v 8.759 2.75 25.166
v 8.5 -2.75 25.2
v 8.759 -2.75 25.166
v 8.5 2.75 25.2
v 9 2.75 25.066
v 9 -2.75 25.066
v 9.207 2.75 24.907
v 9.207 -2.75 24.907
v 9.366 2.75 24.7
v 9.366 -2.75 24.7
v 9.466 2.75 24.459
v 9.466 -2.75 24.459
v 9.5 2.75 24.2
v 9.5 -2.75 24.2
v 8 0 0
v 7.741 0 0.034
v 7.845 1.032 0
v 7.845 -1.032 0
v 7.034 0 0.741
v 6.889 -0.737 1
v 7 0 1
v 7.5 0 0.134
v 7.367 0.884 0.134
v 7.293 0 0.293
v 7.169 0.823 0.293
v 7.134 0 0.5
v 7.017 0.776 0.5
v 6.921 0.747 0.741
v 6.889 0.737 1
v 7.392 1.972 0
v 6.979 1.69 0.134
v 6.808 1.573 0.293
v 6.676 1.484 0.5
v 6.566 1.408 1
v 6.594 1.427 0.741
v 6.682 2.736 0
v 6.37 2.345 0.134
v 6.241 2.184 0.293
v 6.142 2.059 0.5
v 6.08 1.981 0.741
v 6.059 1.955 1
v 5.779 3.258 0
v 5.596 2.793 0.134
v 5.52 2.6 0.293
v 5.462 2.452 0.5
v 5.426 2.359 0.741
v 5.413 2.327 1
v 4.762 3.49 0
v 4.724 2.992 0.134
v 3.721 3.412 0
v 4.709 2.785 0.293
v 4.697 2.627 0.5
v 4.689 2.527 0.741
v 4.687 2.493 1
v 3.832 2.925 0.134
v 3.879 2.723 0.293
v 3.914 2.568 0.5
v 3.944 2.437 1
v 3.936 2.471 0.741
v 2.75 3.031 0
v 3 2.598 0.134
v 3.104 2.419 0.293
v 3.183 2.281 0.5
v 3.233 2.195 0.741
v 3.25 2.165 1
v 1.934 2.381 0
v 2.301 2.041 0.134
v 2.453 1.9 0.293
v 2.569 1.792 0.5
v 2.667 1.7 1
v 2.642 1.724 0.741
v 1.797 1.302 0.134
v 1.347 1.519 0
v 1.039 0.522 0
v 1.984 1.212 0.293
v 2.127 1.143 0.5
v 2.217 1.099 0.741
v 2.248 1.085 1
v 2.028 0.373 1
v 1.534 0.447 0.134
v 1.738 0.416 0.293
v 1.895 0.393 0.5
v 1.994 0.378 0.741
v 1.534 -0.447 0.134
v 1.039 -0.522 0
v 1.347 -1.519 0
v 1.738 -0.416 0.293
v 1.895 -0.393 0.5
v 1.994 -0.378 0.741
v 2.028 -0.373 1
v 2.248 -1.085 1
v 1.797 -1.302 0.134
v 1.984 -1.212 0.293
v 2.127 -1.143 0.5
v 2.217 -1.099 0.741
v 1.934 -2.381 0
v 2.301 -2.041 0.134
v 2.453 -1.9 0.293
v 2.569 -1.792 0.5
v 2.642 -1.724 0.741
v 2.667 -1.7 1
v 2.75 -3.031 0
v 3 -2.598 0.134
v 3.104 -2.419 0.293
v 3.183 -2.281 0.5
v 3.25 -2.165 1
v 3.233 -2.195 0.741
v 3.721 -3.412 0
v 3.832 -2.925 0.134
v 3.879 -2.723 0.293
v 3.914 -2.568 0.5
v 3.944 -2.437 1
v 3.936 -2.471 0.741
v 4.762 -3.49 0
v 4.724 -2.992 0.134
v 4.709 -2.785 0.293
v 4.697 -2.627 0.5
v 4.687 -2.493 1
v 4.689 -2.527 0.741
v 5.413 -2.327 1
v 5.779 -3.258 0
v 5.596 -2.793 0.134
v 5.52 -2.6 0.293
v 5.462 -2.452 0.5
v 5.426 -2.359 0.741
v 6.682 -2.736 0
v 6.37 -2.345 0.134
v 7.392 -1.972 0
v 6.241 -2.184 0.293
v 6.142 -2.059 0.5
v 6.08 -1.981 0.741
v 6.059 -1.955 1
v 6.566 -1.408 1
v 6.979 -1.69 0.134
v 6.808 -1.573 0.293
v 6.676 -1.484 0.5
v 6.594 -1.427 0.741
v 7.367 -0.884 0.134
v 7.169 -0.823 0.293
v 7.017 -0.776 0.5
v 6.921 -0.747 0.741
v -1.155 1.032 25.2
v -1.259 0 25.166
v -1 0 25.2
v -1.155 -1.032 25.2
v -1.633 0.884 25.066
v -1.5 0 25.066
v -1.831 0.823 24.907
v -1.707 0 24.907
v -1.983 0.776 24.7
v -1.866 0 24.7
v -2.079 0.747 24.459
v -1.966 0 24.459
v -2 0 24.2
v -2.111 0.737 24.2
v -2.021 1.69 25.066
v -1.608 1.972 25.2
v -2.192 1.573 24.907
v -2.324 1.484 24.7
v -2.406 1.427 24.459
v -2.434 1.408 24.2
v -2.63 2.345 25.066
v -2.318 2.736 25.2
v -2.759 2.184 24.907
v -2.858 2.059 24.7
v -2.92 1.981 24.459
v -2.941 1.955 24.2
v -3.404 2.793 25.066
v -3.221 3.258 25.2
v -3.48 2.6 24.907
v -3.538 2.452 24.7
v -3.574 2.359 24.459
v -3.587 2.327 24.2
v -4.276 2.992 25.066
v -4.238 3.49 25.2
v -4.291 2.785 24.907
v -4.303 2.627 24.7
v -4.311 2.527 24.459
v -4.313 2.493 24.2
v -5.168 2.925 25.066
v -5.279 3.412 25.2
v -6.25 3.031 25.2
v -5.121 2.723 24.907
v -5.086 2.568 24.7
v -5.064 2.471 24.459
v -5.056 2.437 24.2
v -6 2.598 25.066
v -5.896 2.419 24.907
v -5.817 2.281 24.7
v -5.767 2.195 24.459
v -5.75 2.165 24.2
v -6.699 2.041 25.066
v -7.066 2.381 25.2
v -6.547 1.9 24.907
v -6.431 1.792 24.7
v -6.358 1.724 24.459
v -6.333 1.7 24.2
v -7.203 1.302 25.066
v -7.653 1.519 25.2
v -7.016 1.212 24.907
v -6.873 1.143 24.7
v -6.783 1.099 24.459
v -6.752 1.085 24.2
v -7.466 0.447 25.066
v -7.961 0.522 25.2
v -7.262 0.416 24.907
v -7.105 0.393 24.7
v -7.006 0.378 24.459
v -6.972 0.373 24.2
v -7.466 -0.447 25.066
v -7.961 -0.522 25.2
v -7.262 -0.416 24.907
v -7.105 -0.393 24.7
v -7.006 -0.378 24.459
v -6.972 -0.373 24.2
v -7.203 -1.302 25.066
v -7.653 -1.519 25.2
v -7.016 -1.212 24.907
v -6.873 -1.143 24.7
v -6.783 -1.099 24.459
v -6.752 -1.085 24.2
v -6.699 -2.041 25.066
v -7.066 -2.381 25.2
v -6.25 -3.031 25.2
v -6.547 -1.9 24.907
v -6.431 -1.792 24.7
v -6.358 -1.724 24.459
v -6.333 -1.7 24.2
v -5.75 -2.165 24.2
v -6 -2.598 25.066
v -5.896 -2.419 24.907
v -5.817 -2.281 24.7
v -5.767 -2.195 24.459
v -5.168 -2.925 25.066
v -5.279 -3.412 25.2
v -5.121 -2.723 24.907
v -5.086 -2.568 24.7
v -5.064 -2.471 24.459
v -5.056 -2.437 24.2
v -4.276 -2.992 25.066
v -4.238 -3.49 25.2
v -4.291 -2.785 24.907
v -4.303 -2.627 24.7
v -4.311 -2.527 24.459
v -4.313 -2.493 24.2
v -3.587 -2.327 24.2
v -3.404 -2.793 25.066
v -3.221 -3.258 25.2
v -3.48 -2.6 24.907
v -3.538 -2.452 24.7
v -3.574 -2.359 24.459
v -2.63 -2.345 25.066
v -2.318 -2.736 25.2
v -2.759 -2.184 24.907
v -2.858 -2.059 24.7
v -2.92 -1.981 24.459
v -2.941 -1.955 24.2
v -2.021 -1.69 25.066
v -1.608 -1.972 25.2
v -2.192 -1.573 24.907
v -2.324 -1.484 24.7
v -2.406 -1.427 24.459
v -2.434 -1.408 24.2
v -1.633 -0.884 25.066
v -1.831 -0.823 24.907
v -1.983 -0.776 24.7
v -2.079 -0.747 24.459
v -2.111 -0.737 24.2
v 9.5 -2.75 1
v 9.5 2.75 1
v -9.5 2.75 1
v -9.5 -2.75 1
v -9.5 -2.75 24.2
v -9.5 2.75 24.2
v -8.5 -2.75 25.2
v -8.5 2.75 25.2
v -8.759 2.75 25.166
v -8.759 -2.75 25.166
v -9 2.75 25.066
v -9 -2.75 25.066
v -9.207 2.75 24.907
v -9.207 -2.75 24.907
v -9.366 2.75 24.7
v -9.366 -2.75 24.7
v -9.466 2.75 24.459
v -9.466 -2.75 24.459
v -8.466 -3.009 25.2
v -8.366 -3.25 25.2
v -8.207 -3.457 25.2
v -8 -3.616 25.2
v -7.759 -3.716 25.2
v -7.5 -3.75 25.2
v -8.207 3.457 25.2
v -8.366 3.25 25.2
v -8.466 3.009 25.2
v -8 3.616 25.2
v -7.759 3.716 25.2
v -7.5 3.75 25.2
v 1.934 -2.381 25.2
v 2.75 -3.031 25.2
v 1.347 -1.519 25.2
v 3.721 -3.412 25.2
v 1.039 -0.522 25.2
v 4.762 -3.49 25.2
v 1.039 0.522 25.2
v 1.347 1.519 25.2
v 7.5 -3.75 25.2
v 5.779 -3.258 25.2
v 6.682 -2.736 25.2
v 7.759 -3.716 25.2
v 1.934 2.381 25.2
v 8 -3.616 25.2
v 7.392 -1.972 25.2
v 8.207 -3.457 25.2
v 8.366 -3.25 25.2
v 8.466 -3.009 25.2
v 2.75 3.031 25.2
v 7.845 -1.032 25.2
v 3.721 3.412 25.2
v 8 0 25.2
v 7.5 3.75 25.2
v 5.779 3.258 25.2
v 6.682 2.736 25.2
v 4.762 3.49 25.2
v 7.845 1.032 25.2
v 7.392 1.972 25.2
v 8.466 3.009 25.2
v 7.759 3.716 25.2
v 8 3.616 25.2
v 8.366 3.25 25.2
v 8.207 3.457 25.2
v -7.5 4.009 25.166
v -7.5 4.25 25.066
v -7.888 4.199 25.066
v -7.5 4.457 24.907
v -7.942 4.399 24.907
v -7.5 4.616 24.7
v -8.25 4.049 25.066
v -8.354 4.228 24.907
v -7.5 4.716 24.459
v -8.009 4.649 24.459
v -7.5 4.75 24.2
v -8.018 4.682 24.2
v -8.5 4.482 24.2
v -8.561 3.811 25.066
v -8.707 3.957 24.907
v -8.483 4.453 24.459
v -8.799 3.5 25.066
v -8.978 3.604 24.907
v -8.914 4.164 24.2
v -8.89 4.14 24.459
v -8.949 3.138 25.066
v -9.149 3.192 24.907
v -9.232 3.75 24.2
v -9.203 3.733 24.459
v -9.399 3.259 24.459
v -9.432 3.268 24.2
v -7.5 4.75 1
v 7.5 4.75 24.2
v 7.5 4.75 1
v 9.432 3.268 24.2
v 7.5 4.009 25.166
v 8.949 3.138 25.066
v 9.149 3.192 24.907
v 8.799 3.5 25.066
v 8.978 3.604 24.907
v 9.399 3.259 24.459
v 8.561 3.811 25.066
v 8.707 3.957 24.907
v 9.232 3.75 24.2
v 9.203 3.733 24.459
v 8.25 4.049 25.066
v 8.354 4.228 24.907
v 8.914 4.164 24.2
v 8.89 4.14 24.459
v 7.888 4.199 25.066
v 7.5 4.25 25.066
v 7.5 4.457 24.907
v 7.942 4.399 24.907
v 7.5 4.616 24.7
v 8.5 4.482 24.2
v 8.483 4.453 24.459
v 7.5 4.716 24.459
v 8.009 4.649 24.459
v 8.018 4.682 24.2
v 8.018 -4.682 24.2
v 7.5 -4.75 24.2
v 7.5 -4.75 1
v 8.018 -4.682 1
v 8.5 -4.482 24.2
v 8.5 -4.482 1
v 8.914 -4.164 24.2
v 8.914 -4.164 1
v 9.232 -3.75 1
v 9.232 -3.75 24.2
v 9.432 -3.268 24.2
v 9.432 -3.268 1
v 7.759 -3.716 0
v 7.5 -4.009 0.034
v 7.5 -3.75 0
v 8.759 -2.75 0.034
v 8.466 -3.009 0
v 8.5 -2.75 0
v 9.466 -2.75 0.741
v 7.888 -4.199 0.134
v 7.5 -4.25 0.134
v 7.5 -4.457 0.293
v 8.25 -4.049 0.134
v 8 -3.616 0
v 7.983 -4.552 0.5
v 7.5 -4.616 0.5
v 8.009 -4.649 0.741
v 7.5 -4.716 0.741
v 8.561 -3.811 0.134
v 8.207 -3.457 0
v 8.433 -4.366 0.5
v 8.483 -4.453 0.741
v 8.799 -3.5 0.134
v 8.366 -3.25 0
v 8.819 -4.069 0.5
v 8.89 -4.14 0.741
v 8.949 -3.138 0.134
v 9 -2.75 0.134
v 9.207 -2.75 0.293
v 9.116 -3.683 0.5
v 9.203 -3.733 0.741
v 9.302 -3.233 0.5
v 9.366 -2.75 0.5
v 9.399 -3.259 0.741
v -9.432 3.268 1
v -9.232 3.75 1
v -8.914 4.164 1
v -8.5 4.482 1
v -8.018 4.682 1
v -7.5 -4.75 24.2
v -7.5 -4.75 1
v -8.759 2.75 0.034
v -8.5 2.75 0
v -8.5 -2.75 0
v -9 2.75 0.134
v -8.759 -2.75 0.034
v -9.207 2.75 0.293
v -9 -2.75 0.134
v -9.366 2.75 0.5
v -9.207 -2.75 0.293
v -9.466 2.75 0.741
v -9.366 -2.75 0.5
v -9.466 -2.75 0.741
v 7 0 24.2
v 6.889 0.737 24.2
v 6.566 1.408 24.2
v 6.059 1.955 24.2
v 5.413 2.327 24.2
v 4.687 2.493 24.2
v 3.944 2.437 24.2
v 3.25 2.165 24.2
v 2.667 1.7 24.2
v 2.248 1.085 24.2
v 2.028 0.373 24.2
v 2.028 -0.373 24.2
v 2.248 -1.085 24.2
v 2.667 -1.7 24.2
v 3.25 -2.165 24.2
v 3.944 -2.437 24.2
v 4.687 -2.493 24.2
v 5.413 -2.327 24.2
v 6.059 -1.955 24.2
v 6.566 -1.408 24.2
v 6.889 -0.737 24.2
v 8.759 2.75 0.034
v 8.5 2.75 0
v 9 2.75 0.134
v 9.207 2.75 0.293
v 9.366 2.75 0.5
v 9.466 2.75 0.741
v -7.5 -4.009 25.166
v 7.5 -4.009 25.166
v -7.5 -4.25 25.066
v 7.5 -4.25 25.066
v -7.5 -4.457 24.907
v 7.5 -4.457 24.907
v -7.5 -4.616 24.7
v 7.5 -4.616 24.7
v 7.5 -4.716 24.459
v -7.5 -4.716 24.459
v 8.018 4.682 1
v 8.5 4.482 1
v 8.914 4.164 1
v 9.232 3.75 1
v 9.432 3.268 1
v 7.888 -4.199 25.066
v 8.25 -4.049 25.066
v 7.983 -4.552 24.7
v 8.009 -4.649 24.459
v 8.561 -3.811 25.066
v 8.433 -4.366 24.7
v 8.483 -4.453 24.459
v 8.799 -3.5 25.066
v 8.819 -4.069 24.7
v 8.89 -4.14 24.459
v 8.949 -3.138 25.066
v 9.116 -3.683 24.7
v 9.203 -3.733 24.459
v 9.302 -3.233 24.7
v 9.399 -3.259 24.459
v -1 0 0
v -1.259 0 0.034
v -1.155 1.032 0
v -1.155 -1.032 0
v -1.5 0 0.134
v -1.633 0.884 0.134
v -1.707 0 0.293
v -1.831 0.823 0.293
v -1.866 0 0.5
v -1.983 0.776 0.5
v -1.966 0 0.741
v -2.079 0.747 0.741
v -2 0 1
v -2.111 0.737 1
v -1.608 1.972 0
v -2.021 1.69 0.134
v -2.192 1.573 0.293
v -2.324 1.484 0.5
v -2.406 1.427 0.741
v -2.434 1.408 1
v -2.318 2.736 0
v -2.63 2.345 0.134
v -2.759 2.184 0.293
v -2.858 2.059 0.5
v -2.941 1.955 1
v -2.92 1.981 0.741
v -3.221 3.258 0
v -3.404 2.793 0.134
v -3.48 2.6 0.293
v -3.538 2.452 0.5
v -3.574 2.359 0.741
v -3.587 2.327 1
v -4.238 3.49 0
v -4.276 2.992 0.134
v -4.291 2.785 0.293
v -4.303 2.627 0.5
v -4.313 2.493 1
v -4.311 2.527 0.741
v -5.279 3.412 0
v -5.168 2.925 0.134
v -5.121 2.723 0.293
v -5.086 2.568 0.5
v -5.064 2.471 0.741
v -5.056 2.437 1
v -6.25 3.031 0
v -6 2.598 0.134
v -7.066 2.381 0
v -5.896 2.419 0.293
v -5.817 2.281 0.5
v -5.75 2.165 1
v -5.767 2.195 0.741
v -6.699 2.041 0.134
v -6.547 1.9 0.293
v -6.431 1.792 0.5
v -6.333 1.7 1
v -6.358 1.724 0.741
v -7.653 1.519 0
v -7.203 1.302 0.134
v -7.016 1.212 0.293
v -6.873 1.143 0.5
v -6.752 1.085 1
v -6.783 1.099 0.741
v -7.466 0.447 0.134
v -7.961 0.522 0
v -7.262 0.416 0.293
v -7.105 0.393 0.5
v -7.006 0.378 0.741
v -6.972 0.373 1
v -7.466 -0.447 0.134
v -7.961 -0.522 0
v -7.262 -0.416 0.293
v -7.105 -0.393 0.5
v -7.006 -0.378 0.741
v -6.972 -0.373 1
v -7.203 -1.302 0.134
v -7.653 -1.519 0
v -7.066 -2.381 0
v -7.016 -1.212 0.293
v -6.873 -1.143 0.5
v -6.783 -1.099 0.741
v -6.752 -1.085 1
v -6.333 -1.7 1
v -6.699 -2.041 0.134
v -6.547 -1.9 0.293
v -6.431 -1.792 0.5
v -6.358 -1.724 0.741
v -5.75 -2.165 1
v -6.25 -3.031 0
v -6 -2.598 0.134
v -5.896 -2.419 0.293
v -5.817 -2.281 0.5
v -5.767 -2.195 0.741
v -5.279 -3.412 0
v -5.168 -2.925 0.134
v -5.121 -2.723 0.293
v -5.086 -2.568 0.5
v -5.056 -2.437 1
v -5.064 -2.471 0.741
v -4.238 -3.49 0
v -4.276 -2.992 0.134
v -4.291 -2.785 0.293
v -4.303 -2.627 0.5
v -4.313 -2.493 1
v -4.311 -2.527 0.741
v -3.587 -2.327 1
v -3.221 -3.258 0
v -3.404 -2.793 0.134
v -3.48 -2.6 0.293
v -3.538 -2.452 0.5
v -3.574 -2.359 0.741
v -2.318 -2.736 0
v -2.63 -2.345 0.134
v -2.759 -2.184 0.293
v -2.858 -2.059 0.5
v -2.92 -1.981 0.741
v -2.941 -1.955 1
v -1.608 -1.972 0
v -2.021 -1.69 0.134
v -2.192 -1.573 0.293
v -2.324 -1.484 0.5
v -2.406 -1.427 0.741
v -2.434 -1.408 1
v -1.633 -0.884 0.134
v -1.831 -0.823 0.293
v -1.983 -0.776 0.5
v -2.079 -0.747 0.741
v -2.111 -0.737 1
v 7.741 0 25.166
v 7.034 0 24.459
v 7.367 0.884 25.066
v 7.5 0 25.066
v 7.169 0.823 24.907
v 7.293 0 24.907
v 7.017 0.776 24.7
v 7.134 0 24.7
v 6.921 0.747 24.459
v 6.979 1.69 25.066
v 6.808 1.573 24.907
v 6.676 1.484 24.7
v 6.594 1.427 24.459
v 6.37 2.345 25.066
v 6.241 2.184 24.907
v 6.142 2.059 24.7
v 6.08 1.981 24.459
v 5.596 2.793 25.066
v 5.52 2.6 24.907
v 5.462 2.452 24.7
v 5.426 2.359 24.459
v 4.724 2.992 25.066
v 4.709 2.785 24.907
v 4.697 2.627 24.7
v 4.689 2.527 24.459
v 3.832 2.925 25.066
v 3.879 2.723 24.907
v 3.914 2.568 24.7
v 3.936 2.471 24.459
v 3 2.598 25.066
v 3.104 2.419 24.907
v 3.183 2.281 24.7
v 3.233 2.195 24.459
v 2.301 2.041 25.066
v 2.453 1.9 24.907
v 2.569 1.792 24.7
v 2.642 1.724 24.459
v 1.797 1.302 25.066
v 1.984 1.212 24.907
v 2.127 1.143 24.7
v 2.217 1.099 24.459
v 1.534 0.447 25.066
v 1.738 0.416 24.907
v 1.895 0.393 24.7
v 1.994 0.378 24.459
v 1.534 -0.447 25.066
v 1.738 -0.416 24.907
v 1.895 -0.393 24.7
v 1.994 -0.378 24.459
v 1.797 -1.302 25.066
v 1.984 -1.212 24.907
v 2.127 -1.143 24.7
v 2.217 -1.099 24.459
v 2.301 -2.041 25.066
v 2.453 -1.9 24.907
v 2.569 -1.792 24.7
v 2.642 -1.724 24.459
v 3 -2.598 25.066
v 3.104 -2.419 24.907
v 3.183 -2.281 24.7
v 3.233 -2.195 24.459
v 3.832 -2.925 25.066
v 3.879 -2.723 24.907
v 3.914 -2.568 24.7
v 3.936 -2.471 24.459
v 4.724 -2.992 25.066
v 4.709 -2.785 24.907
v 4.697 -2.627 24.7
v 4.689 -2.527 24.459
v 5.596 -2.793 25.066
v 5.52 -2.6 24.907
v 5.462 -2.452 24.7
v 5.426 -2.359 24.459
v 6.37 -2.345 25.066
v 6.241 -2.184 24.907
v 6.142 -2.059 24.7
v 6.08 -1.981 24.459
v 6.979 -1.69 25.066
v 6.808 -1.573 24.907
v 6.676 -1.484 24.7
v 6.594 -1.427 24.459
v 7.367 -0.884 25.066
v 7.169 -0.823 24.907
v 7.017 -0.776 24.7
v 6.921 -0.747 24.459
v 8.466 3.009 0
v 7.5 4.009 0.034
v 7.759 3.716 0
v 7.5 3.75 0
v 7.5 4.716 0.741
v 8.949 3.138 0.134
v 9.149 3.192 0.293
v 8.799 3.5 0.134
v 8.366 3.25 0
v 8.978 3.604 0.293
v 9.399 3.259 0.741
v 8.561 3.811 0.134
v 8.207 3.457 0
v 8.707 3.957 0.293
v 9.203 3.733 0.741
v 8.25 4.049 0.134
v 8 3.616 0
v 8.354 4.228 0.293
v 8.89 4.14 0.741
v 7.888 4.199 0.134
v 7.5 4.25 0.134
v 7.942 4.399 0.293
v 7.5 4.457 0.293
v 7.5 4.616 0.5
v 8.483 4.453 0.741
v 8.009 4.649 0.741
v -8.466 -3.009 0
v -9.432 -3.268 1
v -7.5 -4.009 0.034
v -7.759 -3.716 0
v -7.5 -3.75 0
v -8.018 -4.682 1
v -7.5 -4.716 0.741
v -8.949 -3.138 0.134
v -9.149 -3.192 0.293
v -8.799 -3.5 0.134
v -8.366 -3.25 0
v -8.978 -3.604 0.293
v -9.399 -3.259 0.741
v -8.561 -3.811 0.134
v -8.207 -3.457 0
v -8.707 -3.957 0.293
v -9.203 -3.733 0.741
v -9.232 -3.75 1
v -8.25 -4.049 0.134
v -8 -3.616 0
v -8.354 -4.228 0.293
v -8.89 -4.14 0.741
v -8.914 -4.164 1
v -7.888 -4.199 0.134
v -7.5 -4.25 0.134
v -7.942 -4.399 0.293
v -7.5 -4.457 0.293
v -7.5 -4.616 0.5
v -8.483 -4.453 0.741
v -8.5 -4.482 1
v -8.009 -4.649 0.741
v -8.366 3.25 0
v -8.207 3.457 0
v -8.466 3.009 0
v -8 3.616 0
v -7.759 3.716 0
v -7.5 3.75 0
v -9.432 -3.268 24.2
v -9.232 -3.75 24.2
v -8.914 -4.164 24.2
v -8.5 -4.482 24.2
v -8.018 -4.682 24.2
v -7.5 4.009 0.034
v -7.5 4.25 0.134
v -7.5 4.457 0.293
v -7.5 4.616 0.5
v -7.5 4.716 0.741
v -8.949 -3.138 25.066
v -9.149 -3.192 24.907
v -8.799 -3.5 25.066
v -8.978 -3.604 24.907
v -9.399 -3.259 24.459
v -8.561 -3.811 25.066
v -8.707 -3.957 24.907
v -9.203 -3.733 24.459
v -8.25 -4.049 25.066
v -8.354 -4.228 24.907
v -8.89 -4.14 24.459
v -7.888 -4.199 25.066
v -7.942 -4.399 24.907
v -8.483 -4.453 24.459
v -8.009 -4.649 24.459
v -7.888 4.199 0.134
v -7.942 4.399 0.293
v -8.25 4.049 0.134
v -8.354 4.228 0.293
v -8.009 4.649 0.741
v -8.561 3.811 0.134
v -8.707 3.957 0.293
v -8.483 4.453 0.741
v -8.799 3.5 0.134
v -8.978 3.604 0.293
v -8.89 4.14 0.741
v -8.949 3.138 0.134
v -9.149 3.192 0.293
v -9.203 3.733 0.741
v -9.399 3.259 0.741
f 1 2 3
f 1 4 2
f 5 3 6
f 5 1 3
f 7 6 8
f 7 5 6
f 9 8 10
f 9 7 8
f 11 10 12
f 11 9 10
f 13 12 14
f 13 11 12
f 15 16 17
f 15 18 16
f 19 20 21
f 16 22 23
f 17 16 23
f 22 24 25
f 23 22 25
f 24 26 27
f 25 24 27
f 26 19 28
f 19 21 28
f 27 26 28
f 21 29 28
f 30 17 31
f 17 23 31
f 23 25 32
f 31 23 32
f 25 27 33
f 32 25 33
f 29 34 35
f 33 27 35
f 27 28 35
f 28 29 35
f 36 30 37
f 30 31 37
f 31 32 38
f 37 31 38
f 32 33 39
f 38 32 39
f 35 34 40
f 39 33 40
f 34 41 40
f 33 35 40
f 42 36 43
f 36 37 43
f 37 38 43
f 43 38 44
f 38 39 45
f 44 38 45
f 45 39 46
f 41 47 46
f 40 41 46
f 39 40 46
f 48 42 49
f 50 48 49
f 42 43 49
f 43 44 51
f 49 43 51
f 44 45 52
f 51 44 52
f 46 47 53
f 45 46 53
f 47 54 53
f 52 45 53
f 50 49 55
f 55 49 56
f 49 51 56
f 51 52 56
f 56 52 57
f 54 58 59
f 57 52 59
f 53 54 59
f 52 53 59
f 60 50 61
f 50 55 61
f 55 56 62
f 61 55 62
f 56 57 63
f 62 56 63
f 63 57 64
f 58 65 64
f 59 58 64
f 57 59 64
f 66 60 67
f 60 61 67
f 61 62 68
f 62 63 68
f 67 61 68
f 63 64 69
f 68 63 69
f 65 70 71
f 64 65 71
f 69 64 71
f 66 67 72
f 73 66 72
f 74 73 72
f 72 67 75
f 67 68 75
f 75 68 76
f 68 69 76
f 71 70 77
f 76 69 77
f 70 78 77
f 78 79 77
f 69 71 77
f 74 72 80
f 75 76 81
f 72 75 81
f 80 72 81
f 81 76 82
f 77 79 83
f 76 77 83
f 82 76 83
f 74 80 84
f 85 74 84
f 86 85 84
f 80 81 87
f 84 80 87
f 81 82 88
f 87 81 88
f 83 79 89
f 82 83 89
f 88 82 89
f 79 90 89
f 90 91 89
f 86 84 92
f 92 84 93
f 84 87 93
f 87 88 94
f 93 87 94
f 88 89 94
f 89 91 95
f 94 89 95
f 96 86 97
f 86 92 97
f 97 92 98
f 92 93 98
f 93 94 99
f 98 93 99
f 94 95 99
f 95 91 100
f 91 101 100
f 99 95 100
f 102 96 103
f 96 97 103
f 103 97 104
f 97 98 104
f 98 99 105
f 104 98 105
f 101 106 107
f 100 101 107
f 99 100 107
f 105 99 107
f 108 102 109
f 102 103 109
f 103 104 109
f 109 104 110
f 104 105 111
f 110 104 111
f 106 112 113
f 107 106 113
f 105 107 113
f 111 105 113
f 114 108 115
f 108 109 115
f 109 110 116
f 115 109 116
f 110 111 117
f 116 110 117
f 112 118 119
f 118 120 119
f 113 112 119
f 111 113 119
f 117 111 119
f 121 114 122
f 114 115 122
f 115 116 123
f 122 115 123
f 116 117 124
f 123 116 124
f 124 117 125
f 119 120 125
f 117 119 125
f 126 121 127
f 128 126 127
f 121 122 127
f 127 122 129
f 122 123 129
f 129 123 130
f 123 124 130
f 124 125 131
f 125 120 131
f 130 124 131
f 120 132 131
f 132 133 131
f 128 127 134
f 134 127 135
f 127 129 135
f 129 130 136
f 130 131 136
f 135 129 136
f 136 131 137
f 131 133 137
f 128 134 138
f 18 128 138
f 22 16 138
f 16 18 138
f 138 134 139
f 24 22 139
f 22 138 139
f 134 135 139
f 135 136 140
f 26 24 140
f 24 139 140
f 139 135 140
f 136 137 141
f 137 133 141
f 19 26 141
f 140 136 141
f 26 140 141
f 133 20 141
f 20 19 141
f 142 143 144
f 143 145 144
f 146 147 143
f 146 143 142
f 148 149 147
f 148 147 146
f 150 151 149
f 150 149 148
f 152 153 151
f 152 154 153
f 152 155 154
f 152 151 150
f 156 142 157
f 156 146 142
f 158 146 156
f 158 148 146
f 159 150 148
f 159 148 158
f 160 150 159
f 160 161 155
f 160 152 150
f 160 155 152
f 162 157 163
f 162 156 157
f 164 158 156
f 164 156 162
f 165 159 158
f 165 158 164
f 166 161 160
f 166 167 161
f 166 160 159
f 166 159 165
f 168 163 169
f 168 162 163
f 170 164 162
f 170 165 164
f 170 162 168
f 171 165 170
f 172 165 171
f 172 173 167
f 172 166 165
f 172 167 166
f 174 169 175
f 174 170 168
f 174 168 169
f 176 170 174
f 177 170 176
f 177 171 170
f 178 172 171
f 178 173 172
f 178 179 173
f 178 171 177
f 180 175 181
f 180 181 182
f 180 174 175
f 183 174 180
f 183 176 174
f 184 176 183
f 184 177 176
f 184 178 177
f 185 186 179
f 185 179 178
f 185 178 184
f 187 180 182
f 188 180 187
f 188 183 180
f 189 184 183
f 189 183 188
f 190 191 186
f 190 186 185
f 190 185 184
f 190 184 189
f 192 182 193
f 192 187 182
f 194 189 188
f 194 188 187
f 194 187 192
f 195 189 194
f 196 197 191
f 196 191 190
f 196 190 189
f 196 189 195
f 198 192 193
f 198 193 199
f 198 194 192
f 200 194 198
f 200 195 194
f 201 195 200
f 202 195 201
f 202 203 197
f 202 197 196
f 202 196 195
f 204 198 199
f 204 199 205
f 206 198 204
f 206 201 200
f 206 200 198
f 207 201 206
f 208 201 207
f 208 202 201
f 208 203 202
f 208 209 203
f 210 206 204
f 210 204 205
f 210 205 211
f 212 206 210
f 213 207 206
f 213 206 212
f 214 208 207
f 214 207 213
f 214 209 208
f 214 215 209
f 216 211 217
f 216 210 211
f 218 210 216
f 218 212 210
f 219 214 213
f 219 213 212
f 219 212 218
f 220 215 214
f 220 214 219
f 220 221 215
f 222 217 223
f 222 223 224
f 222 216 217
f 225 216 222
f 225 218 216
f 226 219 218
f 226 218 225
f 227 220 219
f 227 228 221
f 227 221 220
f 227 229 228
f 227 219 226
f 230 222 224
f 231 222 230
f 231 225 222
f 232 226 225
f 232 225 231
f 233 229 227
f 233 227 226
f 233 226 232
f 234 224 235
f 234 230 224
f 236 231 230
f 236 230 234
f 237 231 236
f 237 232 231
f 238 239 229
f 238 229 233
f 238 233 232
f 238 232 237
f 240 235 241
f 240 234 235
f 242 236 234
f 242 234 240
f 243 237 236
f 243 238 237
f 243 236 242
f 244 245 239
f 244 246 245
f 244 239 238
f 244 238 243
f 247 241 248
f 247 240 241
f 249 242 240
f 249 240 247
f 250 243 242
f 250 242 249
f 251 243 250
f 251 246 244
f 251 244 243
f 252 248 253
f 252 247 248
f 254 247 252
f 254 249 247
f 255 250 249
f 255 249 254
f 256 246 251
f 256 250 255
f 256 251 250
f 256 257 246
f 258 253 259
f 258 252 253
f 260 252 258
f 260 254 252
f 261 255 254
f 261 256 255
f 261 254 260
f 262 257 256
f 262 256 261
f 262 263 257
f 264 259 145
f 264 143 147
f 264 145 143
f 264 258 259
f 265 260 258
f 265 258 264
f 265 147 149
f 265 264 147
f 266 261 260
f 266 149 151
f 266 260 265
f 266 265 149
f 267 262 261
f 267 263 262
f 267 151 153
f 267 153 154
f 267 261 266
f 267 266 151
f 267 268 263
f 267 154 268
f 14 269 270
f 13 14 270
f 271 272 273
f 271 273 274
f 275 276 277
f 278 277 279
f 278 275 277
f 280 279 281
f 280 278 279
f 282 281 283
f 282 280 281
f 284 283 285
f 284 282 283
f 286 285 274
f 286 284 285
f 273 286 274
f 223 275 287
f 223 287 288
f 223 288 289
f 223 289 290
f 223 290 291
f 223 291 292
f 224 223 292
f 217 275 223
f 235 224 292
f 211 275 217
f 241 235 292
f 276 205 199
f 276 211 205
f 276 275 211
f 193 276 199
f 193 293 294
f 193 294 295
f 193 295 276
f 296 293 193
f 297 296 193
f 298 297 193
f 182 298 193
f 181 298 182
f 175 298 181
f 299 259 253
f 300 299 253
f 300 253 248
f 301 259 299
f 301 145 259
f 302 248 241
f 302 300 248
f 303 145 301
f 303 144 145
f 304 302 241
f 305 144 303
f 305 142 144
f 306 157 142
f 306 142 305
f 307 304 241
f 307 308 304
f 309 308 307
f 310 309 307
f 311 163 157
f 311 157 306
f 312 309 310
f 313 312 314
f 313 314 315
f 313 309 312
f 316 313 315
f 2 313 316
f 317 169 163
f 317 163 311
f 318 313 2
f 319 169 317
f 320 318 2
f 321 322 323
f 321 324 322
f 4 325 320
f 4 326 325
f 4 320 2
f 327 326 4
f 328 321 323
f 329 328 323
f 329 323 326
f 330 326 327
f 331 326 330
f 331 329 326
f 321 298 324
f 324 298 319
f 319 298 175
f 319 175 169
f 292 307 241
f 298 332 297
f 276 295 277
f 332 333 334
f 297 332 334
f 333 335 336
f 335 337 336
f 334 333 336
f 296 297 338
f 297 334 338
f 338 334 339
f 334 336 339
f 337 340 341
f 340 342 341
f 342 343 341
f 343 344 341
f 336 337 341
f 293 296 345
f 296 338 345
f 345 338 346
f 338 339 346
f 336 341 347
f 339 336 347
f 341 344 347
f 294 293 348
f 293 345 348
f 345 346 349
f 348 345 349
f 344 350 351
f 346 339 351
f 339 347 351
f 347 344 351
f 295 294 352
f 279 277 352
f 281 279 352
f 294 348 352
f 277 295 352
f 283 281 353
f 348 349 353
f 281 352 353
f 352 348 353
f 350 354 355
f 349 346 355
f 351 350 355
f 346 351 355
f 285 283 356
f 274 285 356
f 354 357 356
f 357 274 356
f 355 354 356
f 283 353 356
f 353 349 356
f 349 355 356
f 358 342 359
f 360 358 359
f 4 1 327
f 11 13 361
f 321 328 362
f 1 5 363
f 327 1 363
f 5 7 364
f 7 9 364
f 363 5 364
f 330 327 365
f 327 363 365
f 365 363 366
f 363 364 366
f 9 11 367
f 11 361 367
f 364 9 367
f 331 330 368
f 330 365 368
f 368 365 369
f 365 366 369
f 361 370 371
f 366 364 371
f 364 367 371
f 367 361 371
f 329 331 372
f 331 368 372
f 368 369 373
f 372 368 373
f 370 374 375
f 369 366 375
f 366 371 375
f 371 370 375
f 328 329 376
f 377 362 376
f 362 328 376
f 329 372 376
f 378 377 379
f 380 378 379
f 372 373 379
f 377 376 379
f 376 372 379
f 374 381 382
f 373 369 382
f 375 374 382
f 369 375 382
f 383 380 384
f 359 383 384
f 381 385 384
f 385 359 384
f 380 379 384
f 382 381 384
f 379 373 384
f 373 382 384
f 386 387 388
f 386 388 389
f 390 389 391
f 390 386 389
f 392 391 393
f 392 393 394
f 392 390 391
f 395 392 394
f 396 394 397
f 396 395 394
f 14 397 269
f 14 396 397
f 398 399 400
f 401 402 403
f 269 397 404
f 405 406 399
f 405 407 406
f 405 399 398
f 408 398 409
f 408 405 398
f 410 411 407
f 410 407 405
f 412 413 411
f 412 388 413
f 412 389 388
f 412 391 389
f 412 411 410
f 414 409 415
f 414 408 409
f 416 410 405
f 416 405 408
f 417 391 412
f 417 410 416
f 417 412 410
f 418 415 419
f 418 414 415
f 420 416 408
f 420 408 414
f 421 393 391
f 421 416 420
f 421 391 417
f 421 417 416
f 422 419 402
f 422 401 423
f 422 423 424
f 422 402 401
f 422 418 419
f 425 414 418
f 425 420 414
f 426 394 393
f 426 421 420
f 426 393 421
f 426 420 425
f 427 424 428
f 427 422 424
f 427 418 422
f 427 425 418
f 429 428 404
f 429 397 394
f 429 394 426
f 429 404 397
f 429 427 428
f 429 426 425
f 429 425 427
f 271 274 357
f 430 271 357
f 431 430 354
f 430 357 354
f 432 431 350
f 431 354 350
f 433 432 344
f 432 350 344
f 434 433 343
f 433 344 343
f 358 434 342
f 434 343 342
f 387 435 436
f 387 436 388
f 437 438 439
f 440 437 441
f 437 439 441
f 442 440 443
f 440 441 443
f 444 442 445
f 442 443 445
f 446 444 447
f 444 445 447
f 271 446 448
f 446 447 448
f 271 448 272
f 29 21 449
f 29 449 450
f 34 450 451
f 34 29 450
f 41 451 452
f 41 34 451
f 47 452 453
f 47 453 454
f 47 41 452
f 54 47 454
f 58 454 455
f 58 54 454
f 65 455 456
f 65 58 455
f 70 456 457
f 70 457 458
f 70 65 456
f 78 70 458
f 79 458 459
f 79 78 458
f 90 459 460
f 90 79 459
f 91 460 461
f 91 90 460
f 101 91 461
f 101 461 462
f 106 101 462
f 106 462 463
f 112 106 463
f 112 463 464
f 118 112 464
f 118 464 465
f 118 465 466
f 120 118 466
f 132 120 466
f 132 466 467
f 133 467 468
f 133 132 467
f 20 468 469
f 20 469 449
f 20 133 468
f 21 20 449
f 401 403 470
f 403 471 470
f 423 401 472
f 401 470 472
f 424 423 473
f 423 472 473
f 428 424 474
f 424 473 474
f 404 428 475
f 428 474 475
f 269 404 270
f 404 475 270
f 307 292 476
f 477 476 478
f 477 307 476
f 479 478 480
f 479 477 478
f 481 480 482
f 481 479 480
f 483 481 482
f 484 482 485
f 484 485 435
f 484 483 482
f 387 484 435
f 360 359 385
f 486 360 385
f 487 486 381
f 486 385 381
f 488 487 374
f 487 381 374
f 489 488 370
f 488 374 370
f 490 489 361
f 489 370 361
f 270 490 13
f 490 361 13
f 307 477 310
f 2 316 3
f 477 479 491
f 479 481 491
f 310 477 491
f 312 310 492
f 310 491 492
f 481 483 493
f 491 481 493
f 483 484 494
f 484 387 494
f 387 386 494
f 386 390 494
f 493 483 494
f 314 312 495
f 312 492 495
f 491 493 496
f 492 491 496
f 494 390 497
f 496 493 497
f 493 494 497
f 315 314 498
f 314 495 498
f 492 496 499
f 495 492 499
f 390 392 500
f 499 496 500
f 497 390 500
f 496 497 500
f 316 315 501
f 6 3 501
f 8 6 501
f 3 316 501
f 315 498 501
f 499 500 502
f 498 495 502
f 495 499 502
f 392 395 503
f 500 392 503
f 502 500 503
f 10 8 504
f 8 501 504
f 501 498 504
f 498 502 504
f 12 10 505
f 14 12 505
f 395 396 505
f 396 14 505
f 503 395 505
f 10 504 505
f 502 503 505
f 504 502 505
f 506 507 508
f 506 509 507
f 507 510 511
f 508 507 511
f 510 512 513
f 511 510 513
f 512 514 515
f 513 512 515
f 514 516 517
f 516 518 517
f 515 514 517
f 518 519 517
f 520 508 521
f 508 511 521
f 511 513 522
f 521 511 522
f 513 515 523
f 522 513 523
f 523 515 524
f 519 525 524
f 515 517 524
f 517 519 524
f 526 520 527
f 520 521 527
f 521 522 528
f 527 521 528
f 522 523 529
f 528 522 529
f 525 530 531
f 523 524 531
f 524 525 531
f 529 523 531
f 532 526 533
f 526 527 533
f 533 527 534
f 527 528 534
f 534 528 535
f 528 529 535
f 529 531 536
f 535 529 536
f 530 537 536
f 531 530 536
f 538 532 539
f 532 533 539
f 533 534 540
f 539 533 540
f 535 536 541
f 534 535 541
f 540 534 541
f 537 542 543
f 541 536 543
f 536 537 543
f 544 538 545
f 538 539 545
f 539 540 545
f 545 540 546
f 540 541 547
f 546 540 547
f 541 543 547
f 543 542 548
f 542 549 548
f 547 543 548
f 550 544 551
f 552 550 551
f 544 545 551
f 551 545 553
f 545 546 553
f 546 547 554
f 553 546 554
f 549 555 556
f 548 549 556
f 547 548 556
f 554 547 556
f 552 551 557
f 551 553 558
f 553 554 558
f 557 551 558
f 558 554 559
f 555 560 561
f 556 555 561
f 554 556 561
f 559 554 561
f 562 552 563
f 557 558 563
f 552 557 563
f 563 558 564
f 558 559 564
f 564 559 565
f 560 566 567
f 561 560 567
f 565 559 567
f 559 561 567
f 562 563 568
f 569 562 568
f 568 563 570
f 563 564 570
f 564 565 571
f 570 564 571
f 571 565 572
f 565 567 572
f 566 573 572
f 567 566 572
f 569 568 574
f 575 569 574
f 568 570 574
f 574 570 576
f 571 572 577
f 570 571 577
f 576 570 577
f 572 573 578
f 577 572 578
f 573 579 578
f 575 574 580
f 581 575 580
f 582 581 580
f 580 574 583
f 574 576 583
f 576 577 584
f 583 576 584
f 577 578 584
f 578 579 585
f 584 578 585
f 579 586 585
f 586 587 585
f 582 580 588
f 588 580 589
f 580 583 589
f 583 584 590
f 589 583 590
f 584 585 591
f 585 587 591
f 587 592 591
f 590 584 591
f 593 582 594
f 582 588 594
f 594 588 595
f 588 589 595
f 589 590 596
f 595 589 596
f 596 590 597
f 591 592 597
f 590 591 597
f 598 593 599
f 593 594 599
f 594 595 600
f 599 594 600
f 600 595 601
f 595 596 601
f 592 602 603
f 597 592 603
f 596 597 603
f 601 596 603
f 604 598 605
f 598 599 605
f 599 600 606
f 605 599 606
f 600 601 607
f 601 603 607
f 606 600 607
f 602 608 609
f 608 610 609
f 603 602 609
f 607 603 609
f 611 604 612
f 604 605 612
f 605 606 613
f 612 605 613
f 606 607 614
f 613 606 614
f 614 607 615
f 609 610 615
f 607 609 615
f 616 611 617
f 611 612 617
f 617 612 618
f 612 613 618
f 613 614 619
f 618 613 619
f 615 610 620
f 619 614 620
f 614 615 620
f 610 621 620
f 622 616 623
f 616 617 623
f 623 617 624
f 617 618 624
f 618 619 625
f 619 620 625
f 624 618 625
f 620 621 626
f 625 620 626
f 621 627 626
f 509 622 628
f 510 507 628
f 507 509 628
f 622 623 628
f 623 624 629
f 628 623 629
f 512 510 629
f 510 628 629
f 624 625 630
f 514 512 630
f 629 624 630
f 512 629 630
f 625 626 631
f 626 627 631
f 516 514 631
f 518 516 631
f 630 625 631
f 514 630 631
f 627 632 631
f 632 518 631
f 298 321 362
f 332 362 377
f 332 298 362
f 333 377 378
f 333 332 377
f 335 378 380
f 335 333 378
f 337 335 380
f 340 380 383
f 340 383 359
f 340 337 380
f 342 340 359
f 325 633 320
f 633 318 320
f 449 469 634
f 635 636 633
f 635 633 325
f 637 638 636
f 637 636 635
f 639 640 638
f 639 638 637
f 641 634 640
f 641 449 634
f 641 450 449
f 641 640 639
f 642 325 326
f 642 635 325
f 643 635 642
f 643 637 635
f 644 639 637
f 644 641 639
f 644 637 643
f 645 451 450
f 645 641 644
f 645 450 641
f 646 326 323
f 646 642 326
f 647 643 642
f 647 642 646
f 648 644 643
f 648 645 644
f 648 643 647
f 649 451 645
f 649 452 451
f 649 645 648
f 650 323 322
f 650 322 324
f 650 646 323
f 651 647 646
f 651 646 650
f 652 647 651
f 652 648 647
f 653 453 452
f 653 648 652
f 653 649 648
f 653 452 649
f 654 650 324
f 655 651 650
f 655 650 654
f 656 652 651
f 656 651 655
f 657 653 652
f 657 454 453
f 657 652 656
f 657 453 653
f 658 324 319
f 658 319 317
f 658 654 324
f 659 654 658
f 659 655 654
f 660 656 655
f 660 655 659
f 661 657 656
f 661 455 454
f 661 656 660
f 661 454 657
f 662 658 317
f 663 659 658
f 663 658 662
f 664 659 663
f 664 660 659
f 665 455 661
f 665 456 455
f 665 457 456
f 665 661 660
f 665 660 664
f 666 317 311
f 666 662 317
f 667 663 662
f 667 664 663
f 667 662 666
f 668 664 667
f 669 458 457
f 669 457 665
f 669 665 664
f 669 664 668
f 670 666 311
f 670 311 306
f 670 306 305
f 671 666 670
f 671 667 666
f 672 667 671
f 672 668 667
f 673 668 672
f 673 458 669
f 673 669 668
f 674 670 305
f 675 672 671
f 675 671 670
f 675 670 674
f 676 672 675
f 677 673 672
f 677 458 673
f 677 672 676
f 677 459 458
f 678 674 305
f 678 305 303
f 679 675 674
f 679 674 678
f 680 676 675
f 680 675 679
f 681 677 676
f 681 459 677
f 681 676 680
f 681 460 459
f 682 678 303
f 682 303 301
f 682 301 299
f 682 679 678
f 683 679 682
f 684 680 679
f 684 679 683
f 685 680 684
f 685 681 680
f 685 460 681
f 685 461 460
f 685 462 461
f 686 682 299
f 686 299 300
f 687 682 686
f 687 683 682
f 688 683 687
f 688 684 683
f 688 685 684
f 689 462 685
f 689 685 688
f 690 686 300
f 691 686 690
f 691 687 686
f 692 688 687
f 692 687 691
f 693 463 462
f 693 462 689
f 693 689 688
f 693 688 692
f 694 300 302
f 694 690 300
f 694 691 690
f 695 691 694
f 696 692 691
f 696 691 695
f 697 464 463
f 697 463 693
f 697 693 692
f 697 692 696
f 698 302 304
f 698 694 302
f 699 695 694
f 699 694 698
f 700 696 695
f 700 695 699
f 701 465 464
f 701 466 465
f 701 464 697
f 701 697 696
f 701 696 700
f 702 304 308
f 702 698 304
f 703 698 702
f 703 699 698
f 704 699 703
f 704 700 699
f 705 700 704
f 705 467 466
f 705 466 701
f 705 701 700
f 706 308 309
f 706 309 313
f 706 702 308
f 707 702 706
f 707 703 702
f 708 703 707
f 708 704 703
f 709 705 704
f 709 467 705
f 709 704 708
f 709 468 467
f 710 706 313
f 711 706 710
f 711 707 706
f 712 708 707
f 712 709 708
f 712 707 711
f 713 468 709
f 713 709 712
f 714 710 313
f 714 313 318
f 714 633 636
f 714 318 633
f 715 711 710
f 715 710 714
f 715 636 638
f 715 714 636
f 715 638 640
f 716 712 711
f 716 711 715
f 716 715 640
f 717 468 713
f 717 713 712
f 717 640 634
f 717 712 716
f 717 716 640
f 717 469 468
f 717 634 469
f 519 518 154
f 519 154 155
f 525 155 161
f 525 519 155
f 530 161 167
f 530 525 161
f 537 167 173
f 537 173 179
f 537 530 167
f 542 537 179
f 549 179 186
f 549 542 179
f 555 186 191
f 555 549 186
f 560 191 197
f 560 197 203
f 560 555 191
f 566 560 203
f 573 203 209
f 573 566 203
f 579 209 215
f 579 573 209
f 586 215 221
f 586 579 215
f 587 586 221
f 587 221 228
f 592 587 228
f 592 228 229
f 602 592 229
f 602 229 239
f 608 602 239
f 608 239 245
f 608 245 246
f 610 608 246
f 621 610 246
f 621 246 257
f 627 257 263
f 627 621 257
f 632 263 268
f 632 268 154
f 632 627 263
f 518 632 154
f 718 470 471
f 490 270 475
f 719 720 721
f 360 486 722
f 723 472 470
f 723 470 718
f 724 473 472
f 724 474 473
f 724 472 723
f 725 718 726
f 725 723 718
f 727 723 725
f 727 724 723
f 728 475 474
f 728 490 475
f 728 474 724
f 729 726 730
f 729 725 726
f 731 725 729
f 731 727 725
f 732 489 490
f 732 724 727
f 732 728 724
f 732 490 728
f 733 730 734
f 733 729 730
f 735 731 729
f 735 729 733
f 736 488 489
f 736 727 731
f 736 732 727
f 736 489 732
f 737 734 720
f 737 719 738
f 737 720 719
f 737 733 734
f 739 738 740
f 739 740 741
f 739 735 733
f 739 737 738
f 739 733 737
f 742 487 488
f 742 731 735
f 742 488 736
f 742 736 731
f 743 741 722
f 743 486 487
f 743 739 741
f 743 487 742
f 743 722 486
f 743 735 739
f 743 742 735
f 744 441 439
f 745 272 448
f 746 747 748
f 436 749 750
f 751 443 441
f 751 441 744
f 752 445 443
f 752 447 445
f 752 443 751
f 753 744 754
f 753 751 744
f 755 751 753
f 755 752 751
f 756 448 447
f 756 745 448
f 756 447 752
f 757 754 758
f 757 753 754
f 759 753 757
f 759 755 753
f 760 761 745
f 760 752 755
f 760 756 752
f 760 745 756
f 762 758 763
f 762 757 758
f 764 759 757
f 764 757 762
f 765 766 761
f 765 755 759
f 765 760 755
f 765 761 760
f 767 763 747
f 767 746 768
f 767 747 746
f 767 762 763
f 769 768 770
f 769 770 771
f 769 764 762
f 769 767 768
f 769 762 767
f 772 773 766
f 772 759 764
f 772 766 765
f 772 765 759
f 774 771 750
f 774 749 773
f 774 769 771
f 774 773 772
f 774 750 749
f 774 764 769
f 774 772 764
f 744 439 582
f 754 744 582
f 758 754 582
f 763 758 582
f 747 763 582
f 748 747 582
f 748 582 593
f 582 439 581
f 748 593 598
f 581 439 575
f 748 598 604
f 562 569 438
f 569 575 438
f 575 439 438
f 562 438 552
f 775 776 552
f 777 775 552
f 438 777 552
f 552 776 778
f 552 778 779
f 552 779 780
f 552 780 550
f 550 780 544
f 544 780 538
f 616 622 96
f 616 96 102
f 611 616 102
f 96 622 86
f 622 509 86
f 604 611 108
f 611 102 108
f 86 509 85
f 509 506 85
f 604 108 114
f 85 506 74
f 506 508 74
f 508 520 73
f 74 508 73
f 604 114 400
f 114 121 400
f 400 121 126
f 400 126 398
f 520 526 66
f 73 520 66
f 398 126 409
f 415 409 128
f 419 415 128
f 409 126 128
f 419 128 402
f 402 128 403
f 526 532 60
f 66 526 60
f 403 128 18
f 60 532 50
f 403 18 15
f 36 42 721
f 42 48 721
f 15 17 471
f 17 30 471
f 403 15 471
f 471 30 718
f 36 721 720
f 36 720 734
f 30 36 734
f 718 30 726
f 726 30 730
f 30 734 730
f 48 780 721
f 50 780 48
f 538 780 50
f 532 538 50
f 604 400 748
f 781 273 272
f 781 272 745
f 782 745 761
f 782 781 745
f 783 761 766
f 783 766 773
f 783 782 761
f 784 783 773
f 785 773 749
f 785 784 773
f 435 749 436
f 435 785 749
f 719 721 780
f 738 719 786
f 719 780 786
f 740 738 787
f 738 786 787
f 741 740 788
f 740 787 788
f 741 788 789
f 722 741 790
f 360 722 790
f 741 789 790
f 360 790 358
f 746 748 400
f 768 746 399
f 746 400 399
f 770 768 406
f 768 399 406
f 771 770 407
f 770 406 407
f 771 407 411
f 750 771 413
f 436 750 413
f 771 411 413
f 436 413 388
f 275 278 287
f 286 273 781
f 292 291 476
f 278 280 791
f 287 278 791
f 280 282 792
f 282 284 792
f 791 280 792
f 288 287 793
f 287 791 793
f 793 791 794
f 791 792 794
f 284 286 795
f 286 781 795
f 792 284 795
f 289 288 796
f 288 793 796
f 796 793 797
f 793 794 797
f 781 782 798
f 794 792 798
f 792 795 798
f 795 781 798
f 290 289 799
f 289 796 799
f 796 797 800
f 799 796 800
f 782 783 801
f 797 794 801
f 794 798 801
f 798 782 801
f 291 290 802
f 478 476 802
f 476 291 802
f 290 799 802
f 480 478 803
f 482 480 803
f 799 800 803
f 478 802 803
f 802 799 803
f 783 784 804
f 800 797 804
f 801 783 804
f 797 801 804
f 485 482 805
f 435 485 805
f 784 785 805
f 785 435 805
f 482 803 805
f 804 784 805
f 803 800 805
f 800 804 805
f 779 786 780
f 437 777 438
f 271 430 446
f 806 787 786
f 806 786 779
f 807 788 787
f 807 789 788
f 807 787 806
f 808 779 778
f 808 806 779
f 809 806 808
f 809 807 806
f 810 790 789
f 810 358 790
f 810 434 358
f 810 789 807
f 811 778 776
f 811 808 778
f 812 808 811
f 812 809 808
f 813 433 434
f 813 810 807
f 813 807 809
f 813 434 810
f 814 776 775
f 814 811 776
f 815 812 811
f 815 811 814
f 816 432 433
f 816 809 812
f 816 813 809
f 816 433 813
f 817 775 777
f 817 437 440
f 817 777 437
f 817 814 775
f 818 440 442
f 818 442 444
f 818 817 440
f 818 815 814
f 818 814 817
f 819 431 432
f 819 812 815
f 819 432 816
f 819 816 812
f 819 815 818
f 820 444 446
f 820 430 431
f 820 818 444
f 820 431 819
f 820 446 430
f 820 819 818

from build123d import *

# Parameters (mm, degrees)
SKETCH_1_W      = 19
SKETCH_1_H      = 9.5
SKETCH_1_R      = 2.5
EXTRUDE_1_DEPTH = 25.2
FILLET_1_R      = 2
FILLET_2_R      = 1
FILLET_3_R      = 1


with BuildPart() as part:
    # Эскиз1 → Бобышка-Вытянуть1 (new body)
    with BuildSketch(Plane.XY):
        Rectangle(SKETCH_1_W, SKETCH_1_H)
        with Locations((-4.5, 0)):
            Circle(SKETCH_1_R, mode=Mode.SUBTRACT)
        with Locations((4.5, 0)):
            Circle(SKETCH_1_R, mode=Mode.SUBTRACT)
    extrude(amount=EXTRUDE_1_DEPTH)

    # Скругление1
    fillet_1_edges = [part.edges().sort_by_distance(p)[0] for p in [
        (9.5, -4.75, 12.6),
        (-9.5, -4.75, 12.6),
        (-9.5, 4.75, 12.6),
        (9.5, 4.75, 12.6),
    ]]
    fillet(fillet_1_edges, radius=FILLET_1_R)

    # Скругление2
    fillet_2_edges = [part.edges().sort_by_distance(p)[0] for p in [
        (-7, 0, 25.2),
        (2, 0, 25.2),
        (9.5, 0, 25.2),
        (0, -4.75, 25.2),
        (0, 4.75, 25.2),
        (-9.5, 0, 25.2),
        (-8.914213562, 4.164213562, 25.2),
        (-8.914213562, -4.164213562, 25.2),
        (8.914213562, 4.164213562, 25.2),
        (8.914213562, -4.164213562, 25.2),
    ]]
    fillet(fillet_2_edges, radius=FILLET_2_R)

    # Скругление3
    fillet_3_edges = [part.edges().sort_by_distance(p)[0] for p in [
        (-7, 0, 0),
        (2, 0, 0),
        (9.5, 0, 0),
        (0, -4.75, 0),
        (-9.5, 0, 0),
        (0, 4.75, 0),
        (-8.914213562, 4.164213562, 0),
        (-8.914213562, -4.164213562, 0),
        (8.914213562, 4.164213562, 0),
        (8.914213562, -4.164213562, 0),
    ]]
    fillet(fillet_3_edges, radius=FILLET_3_R)


solid = part.part
